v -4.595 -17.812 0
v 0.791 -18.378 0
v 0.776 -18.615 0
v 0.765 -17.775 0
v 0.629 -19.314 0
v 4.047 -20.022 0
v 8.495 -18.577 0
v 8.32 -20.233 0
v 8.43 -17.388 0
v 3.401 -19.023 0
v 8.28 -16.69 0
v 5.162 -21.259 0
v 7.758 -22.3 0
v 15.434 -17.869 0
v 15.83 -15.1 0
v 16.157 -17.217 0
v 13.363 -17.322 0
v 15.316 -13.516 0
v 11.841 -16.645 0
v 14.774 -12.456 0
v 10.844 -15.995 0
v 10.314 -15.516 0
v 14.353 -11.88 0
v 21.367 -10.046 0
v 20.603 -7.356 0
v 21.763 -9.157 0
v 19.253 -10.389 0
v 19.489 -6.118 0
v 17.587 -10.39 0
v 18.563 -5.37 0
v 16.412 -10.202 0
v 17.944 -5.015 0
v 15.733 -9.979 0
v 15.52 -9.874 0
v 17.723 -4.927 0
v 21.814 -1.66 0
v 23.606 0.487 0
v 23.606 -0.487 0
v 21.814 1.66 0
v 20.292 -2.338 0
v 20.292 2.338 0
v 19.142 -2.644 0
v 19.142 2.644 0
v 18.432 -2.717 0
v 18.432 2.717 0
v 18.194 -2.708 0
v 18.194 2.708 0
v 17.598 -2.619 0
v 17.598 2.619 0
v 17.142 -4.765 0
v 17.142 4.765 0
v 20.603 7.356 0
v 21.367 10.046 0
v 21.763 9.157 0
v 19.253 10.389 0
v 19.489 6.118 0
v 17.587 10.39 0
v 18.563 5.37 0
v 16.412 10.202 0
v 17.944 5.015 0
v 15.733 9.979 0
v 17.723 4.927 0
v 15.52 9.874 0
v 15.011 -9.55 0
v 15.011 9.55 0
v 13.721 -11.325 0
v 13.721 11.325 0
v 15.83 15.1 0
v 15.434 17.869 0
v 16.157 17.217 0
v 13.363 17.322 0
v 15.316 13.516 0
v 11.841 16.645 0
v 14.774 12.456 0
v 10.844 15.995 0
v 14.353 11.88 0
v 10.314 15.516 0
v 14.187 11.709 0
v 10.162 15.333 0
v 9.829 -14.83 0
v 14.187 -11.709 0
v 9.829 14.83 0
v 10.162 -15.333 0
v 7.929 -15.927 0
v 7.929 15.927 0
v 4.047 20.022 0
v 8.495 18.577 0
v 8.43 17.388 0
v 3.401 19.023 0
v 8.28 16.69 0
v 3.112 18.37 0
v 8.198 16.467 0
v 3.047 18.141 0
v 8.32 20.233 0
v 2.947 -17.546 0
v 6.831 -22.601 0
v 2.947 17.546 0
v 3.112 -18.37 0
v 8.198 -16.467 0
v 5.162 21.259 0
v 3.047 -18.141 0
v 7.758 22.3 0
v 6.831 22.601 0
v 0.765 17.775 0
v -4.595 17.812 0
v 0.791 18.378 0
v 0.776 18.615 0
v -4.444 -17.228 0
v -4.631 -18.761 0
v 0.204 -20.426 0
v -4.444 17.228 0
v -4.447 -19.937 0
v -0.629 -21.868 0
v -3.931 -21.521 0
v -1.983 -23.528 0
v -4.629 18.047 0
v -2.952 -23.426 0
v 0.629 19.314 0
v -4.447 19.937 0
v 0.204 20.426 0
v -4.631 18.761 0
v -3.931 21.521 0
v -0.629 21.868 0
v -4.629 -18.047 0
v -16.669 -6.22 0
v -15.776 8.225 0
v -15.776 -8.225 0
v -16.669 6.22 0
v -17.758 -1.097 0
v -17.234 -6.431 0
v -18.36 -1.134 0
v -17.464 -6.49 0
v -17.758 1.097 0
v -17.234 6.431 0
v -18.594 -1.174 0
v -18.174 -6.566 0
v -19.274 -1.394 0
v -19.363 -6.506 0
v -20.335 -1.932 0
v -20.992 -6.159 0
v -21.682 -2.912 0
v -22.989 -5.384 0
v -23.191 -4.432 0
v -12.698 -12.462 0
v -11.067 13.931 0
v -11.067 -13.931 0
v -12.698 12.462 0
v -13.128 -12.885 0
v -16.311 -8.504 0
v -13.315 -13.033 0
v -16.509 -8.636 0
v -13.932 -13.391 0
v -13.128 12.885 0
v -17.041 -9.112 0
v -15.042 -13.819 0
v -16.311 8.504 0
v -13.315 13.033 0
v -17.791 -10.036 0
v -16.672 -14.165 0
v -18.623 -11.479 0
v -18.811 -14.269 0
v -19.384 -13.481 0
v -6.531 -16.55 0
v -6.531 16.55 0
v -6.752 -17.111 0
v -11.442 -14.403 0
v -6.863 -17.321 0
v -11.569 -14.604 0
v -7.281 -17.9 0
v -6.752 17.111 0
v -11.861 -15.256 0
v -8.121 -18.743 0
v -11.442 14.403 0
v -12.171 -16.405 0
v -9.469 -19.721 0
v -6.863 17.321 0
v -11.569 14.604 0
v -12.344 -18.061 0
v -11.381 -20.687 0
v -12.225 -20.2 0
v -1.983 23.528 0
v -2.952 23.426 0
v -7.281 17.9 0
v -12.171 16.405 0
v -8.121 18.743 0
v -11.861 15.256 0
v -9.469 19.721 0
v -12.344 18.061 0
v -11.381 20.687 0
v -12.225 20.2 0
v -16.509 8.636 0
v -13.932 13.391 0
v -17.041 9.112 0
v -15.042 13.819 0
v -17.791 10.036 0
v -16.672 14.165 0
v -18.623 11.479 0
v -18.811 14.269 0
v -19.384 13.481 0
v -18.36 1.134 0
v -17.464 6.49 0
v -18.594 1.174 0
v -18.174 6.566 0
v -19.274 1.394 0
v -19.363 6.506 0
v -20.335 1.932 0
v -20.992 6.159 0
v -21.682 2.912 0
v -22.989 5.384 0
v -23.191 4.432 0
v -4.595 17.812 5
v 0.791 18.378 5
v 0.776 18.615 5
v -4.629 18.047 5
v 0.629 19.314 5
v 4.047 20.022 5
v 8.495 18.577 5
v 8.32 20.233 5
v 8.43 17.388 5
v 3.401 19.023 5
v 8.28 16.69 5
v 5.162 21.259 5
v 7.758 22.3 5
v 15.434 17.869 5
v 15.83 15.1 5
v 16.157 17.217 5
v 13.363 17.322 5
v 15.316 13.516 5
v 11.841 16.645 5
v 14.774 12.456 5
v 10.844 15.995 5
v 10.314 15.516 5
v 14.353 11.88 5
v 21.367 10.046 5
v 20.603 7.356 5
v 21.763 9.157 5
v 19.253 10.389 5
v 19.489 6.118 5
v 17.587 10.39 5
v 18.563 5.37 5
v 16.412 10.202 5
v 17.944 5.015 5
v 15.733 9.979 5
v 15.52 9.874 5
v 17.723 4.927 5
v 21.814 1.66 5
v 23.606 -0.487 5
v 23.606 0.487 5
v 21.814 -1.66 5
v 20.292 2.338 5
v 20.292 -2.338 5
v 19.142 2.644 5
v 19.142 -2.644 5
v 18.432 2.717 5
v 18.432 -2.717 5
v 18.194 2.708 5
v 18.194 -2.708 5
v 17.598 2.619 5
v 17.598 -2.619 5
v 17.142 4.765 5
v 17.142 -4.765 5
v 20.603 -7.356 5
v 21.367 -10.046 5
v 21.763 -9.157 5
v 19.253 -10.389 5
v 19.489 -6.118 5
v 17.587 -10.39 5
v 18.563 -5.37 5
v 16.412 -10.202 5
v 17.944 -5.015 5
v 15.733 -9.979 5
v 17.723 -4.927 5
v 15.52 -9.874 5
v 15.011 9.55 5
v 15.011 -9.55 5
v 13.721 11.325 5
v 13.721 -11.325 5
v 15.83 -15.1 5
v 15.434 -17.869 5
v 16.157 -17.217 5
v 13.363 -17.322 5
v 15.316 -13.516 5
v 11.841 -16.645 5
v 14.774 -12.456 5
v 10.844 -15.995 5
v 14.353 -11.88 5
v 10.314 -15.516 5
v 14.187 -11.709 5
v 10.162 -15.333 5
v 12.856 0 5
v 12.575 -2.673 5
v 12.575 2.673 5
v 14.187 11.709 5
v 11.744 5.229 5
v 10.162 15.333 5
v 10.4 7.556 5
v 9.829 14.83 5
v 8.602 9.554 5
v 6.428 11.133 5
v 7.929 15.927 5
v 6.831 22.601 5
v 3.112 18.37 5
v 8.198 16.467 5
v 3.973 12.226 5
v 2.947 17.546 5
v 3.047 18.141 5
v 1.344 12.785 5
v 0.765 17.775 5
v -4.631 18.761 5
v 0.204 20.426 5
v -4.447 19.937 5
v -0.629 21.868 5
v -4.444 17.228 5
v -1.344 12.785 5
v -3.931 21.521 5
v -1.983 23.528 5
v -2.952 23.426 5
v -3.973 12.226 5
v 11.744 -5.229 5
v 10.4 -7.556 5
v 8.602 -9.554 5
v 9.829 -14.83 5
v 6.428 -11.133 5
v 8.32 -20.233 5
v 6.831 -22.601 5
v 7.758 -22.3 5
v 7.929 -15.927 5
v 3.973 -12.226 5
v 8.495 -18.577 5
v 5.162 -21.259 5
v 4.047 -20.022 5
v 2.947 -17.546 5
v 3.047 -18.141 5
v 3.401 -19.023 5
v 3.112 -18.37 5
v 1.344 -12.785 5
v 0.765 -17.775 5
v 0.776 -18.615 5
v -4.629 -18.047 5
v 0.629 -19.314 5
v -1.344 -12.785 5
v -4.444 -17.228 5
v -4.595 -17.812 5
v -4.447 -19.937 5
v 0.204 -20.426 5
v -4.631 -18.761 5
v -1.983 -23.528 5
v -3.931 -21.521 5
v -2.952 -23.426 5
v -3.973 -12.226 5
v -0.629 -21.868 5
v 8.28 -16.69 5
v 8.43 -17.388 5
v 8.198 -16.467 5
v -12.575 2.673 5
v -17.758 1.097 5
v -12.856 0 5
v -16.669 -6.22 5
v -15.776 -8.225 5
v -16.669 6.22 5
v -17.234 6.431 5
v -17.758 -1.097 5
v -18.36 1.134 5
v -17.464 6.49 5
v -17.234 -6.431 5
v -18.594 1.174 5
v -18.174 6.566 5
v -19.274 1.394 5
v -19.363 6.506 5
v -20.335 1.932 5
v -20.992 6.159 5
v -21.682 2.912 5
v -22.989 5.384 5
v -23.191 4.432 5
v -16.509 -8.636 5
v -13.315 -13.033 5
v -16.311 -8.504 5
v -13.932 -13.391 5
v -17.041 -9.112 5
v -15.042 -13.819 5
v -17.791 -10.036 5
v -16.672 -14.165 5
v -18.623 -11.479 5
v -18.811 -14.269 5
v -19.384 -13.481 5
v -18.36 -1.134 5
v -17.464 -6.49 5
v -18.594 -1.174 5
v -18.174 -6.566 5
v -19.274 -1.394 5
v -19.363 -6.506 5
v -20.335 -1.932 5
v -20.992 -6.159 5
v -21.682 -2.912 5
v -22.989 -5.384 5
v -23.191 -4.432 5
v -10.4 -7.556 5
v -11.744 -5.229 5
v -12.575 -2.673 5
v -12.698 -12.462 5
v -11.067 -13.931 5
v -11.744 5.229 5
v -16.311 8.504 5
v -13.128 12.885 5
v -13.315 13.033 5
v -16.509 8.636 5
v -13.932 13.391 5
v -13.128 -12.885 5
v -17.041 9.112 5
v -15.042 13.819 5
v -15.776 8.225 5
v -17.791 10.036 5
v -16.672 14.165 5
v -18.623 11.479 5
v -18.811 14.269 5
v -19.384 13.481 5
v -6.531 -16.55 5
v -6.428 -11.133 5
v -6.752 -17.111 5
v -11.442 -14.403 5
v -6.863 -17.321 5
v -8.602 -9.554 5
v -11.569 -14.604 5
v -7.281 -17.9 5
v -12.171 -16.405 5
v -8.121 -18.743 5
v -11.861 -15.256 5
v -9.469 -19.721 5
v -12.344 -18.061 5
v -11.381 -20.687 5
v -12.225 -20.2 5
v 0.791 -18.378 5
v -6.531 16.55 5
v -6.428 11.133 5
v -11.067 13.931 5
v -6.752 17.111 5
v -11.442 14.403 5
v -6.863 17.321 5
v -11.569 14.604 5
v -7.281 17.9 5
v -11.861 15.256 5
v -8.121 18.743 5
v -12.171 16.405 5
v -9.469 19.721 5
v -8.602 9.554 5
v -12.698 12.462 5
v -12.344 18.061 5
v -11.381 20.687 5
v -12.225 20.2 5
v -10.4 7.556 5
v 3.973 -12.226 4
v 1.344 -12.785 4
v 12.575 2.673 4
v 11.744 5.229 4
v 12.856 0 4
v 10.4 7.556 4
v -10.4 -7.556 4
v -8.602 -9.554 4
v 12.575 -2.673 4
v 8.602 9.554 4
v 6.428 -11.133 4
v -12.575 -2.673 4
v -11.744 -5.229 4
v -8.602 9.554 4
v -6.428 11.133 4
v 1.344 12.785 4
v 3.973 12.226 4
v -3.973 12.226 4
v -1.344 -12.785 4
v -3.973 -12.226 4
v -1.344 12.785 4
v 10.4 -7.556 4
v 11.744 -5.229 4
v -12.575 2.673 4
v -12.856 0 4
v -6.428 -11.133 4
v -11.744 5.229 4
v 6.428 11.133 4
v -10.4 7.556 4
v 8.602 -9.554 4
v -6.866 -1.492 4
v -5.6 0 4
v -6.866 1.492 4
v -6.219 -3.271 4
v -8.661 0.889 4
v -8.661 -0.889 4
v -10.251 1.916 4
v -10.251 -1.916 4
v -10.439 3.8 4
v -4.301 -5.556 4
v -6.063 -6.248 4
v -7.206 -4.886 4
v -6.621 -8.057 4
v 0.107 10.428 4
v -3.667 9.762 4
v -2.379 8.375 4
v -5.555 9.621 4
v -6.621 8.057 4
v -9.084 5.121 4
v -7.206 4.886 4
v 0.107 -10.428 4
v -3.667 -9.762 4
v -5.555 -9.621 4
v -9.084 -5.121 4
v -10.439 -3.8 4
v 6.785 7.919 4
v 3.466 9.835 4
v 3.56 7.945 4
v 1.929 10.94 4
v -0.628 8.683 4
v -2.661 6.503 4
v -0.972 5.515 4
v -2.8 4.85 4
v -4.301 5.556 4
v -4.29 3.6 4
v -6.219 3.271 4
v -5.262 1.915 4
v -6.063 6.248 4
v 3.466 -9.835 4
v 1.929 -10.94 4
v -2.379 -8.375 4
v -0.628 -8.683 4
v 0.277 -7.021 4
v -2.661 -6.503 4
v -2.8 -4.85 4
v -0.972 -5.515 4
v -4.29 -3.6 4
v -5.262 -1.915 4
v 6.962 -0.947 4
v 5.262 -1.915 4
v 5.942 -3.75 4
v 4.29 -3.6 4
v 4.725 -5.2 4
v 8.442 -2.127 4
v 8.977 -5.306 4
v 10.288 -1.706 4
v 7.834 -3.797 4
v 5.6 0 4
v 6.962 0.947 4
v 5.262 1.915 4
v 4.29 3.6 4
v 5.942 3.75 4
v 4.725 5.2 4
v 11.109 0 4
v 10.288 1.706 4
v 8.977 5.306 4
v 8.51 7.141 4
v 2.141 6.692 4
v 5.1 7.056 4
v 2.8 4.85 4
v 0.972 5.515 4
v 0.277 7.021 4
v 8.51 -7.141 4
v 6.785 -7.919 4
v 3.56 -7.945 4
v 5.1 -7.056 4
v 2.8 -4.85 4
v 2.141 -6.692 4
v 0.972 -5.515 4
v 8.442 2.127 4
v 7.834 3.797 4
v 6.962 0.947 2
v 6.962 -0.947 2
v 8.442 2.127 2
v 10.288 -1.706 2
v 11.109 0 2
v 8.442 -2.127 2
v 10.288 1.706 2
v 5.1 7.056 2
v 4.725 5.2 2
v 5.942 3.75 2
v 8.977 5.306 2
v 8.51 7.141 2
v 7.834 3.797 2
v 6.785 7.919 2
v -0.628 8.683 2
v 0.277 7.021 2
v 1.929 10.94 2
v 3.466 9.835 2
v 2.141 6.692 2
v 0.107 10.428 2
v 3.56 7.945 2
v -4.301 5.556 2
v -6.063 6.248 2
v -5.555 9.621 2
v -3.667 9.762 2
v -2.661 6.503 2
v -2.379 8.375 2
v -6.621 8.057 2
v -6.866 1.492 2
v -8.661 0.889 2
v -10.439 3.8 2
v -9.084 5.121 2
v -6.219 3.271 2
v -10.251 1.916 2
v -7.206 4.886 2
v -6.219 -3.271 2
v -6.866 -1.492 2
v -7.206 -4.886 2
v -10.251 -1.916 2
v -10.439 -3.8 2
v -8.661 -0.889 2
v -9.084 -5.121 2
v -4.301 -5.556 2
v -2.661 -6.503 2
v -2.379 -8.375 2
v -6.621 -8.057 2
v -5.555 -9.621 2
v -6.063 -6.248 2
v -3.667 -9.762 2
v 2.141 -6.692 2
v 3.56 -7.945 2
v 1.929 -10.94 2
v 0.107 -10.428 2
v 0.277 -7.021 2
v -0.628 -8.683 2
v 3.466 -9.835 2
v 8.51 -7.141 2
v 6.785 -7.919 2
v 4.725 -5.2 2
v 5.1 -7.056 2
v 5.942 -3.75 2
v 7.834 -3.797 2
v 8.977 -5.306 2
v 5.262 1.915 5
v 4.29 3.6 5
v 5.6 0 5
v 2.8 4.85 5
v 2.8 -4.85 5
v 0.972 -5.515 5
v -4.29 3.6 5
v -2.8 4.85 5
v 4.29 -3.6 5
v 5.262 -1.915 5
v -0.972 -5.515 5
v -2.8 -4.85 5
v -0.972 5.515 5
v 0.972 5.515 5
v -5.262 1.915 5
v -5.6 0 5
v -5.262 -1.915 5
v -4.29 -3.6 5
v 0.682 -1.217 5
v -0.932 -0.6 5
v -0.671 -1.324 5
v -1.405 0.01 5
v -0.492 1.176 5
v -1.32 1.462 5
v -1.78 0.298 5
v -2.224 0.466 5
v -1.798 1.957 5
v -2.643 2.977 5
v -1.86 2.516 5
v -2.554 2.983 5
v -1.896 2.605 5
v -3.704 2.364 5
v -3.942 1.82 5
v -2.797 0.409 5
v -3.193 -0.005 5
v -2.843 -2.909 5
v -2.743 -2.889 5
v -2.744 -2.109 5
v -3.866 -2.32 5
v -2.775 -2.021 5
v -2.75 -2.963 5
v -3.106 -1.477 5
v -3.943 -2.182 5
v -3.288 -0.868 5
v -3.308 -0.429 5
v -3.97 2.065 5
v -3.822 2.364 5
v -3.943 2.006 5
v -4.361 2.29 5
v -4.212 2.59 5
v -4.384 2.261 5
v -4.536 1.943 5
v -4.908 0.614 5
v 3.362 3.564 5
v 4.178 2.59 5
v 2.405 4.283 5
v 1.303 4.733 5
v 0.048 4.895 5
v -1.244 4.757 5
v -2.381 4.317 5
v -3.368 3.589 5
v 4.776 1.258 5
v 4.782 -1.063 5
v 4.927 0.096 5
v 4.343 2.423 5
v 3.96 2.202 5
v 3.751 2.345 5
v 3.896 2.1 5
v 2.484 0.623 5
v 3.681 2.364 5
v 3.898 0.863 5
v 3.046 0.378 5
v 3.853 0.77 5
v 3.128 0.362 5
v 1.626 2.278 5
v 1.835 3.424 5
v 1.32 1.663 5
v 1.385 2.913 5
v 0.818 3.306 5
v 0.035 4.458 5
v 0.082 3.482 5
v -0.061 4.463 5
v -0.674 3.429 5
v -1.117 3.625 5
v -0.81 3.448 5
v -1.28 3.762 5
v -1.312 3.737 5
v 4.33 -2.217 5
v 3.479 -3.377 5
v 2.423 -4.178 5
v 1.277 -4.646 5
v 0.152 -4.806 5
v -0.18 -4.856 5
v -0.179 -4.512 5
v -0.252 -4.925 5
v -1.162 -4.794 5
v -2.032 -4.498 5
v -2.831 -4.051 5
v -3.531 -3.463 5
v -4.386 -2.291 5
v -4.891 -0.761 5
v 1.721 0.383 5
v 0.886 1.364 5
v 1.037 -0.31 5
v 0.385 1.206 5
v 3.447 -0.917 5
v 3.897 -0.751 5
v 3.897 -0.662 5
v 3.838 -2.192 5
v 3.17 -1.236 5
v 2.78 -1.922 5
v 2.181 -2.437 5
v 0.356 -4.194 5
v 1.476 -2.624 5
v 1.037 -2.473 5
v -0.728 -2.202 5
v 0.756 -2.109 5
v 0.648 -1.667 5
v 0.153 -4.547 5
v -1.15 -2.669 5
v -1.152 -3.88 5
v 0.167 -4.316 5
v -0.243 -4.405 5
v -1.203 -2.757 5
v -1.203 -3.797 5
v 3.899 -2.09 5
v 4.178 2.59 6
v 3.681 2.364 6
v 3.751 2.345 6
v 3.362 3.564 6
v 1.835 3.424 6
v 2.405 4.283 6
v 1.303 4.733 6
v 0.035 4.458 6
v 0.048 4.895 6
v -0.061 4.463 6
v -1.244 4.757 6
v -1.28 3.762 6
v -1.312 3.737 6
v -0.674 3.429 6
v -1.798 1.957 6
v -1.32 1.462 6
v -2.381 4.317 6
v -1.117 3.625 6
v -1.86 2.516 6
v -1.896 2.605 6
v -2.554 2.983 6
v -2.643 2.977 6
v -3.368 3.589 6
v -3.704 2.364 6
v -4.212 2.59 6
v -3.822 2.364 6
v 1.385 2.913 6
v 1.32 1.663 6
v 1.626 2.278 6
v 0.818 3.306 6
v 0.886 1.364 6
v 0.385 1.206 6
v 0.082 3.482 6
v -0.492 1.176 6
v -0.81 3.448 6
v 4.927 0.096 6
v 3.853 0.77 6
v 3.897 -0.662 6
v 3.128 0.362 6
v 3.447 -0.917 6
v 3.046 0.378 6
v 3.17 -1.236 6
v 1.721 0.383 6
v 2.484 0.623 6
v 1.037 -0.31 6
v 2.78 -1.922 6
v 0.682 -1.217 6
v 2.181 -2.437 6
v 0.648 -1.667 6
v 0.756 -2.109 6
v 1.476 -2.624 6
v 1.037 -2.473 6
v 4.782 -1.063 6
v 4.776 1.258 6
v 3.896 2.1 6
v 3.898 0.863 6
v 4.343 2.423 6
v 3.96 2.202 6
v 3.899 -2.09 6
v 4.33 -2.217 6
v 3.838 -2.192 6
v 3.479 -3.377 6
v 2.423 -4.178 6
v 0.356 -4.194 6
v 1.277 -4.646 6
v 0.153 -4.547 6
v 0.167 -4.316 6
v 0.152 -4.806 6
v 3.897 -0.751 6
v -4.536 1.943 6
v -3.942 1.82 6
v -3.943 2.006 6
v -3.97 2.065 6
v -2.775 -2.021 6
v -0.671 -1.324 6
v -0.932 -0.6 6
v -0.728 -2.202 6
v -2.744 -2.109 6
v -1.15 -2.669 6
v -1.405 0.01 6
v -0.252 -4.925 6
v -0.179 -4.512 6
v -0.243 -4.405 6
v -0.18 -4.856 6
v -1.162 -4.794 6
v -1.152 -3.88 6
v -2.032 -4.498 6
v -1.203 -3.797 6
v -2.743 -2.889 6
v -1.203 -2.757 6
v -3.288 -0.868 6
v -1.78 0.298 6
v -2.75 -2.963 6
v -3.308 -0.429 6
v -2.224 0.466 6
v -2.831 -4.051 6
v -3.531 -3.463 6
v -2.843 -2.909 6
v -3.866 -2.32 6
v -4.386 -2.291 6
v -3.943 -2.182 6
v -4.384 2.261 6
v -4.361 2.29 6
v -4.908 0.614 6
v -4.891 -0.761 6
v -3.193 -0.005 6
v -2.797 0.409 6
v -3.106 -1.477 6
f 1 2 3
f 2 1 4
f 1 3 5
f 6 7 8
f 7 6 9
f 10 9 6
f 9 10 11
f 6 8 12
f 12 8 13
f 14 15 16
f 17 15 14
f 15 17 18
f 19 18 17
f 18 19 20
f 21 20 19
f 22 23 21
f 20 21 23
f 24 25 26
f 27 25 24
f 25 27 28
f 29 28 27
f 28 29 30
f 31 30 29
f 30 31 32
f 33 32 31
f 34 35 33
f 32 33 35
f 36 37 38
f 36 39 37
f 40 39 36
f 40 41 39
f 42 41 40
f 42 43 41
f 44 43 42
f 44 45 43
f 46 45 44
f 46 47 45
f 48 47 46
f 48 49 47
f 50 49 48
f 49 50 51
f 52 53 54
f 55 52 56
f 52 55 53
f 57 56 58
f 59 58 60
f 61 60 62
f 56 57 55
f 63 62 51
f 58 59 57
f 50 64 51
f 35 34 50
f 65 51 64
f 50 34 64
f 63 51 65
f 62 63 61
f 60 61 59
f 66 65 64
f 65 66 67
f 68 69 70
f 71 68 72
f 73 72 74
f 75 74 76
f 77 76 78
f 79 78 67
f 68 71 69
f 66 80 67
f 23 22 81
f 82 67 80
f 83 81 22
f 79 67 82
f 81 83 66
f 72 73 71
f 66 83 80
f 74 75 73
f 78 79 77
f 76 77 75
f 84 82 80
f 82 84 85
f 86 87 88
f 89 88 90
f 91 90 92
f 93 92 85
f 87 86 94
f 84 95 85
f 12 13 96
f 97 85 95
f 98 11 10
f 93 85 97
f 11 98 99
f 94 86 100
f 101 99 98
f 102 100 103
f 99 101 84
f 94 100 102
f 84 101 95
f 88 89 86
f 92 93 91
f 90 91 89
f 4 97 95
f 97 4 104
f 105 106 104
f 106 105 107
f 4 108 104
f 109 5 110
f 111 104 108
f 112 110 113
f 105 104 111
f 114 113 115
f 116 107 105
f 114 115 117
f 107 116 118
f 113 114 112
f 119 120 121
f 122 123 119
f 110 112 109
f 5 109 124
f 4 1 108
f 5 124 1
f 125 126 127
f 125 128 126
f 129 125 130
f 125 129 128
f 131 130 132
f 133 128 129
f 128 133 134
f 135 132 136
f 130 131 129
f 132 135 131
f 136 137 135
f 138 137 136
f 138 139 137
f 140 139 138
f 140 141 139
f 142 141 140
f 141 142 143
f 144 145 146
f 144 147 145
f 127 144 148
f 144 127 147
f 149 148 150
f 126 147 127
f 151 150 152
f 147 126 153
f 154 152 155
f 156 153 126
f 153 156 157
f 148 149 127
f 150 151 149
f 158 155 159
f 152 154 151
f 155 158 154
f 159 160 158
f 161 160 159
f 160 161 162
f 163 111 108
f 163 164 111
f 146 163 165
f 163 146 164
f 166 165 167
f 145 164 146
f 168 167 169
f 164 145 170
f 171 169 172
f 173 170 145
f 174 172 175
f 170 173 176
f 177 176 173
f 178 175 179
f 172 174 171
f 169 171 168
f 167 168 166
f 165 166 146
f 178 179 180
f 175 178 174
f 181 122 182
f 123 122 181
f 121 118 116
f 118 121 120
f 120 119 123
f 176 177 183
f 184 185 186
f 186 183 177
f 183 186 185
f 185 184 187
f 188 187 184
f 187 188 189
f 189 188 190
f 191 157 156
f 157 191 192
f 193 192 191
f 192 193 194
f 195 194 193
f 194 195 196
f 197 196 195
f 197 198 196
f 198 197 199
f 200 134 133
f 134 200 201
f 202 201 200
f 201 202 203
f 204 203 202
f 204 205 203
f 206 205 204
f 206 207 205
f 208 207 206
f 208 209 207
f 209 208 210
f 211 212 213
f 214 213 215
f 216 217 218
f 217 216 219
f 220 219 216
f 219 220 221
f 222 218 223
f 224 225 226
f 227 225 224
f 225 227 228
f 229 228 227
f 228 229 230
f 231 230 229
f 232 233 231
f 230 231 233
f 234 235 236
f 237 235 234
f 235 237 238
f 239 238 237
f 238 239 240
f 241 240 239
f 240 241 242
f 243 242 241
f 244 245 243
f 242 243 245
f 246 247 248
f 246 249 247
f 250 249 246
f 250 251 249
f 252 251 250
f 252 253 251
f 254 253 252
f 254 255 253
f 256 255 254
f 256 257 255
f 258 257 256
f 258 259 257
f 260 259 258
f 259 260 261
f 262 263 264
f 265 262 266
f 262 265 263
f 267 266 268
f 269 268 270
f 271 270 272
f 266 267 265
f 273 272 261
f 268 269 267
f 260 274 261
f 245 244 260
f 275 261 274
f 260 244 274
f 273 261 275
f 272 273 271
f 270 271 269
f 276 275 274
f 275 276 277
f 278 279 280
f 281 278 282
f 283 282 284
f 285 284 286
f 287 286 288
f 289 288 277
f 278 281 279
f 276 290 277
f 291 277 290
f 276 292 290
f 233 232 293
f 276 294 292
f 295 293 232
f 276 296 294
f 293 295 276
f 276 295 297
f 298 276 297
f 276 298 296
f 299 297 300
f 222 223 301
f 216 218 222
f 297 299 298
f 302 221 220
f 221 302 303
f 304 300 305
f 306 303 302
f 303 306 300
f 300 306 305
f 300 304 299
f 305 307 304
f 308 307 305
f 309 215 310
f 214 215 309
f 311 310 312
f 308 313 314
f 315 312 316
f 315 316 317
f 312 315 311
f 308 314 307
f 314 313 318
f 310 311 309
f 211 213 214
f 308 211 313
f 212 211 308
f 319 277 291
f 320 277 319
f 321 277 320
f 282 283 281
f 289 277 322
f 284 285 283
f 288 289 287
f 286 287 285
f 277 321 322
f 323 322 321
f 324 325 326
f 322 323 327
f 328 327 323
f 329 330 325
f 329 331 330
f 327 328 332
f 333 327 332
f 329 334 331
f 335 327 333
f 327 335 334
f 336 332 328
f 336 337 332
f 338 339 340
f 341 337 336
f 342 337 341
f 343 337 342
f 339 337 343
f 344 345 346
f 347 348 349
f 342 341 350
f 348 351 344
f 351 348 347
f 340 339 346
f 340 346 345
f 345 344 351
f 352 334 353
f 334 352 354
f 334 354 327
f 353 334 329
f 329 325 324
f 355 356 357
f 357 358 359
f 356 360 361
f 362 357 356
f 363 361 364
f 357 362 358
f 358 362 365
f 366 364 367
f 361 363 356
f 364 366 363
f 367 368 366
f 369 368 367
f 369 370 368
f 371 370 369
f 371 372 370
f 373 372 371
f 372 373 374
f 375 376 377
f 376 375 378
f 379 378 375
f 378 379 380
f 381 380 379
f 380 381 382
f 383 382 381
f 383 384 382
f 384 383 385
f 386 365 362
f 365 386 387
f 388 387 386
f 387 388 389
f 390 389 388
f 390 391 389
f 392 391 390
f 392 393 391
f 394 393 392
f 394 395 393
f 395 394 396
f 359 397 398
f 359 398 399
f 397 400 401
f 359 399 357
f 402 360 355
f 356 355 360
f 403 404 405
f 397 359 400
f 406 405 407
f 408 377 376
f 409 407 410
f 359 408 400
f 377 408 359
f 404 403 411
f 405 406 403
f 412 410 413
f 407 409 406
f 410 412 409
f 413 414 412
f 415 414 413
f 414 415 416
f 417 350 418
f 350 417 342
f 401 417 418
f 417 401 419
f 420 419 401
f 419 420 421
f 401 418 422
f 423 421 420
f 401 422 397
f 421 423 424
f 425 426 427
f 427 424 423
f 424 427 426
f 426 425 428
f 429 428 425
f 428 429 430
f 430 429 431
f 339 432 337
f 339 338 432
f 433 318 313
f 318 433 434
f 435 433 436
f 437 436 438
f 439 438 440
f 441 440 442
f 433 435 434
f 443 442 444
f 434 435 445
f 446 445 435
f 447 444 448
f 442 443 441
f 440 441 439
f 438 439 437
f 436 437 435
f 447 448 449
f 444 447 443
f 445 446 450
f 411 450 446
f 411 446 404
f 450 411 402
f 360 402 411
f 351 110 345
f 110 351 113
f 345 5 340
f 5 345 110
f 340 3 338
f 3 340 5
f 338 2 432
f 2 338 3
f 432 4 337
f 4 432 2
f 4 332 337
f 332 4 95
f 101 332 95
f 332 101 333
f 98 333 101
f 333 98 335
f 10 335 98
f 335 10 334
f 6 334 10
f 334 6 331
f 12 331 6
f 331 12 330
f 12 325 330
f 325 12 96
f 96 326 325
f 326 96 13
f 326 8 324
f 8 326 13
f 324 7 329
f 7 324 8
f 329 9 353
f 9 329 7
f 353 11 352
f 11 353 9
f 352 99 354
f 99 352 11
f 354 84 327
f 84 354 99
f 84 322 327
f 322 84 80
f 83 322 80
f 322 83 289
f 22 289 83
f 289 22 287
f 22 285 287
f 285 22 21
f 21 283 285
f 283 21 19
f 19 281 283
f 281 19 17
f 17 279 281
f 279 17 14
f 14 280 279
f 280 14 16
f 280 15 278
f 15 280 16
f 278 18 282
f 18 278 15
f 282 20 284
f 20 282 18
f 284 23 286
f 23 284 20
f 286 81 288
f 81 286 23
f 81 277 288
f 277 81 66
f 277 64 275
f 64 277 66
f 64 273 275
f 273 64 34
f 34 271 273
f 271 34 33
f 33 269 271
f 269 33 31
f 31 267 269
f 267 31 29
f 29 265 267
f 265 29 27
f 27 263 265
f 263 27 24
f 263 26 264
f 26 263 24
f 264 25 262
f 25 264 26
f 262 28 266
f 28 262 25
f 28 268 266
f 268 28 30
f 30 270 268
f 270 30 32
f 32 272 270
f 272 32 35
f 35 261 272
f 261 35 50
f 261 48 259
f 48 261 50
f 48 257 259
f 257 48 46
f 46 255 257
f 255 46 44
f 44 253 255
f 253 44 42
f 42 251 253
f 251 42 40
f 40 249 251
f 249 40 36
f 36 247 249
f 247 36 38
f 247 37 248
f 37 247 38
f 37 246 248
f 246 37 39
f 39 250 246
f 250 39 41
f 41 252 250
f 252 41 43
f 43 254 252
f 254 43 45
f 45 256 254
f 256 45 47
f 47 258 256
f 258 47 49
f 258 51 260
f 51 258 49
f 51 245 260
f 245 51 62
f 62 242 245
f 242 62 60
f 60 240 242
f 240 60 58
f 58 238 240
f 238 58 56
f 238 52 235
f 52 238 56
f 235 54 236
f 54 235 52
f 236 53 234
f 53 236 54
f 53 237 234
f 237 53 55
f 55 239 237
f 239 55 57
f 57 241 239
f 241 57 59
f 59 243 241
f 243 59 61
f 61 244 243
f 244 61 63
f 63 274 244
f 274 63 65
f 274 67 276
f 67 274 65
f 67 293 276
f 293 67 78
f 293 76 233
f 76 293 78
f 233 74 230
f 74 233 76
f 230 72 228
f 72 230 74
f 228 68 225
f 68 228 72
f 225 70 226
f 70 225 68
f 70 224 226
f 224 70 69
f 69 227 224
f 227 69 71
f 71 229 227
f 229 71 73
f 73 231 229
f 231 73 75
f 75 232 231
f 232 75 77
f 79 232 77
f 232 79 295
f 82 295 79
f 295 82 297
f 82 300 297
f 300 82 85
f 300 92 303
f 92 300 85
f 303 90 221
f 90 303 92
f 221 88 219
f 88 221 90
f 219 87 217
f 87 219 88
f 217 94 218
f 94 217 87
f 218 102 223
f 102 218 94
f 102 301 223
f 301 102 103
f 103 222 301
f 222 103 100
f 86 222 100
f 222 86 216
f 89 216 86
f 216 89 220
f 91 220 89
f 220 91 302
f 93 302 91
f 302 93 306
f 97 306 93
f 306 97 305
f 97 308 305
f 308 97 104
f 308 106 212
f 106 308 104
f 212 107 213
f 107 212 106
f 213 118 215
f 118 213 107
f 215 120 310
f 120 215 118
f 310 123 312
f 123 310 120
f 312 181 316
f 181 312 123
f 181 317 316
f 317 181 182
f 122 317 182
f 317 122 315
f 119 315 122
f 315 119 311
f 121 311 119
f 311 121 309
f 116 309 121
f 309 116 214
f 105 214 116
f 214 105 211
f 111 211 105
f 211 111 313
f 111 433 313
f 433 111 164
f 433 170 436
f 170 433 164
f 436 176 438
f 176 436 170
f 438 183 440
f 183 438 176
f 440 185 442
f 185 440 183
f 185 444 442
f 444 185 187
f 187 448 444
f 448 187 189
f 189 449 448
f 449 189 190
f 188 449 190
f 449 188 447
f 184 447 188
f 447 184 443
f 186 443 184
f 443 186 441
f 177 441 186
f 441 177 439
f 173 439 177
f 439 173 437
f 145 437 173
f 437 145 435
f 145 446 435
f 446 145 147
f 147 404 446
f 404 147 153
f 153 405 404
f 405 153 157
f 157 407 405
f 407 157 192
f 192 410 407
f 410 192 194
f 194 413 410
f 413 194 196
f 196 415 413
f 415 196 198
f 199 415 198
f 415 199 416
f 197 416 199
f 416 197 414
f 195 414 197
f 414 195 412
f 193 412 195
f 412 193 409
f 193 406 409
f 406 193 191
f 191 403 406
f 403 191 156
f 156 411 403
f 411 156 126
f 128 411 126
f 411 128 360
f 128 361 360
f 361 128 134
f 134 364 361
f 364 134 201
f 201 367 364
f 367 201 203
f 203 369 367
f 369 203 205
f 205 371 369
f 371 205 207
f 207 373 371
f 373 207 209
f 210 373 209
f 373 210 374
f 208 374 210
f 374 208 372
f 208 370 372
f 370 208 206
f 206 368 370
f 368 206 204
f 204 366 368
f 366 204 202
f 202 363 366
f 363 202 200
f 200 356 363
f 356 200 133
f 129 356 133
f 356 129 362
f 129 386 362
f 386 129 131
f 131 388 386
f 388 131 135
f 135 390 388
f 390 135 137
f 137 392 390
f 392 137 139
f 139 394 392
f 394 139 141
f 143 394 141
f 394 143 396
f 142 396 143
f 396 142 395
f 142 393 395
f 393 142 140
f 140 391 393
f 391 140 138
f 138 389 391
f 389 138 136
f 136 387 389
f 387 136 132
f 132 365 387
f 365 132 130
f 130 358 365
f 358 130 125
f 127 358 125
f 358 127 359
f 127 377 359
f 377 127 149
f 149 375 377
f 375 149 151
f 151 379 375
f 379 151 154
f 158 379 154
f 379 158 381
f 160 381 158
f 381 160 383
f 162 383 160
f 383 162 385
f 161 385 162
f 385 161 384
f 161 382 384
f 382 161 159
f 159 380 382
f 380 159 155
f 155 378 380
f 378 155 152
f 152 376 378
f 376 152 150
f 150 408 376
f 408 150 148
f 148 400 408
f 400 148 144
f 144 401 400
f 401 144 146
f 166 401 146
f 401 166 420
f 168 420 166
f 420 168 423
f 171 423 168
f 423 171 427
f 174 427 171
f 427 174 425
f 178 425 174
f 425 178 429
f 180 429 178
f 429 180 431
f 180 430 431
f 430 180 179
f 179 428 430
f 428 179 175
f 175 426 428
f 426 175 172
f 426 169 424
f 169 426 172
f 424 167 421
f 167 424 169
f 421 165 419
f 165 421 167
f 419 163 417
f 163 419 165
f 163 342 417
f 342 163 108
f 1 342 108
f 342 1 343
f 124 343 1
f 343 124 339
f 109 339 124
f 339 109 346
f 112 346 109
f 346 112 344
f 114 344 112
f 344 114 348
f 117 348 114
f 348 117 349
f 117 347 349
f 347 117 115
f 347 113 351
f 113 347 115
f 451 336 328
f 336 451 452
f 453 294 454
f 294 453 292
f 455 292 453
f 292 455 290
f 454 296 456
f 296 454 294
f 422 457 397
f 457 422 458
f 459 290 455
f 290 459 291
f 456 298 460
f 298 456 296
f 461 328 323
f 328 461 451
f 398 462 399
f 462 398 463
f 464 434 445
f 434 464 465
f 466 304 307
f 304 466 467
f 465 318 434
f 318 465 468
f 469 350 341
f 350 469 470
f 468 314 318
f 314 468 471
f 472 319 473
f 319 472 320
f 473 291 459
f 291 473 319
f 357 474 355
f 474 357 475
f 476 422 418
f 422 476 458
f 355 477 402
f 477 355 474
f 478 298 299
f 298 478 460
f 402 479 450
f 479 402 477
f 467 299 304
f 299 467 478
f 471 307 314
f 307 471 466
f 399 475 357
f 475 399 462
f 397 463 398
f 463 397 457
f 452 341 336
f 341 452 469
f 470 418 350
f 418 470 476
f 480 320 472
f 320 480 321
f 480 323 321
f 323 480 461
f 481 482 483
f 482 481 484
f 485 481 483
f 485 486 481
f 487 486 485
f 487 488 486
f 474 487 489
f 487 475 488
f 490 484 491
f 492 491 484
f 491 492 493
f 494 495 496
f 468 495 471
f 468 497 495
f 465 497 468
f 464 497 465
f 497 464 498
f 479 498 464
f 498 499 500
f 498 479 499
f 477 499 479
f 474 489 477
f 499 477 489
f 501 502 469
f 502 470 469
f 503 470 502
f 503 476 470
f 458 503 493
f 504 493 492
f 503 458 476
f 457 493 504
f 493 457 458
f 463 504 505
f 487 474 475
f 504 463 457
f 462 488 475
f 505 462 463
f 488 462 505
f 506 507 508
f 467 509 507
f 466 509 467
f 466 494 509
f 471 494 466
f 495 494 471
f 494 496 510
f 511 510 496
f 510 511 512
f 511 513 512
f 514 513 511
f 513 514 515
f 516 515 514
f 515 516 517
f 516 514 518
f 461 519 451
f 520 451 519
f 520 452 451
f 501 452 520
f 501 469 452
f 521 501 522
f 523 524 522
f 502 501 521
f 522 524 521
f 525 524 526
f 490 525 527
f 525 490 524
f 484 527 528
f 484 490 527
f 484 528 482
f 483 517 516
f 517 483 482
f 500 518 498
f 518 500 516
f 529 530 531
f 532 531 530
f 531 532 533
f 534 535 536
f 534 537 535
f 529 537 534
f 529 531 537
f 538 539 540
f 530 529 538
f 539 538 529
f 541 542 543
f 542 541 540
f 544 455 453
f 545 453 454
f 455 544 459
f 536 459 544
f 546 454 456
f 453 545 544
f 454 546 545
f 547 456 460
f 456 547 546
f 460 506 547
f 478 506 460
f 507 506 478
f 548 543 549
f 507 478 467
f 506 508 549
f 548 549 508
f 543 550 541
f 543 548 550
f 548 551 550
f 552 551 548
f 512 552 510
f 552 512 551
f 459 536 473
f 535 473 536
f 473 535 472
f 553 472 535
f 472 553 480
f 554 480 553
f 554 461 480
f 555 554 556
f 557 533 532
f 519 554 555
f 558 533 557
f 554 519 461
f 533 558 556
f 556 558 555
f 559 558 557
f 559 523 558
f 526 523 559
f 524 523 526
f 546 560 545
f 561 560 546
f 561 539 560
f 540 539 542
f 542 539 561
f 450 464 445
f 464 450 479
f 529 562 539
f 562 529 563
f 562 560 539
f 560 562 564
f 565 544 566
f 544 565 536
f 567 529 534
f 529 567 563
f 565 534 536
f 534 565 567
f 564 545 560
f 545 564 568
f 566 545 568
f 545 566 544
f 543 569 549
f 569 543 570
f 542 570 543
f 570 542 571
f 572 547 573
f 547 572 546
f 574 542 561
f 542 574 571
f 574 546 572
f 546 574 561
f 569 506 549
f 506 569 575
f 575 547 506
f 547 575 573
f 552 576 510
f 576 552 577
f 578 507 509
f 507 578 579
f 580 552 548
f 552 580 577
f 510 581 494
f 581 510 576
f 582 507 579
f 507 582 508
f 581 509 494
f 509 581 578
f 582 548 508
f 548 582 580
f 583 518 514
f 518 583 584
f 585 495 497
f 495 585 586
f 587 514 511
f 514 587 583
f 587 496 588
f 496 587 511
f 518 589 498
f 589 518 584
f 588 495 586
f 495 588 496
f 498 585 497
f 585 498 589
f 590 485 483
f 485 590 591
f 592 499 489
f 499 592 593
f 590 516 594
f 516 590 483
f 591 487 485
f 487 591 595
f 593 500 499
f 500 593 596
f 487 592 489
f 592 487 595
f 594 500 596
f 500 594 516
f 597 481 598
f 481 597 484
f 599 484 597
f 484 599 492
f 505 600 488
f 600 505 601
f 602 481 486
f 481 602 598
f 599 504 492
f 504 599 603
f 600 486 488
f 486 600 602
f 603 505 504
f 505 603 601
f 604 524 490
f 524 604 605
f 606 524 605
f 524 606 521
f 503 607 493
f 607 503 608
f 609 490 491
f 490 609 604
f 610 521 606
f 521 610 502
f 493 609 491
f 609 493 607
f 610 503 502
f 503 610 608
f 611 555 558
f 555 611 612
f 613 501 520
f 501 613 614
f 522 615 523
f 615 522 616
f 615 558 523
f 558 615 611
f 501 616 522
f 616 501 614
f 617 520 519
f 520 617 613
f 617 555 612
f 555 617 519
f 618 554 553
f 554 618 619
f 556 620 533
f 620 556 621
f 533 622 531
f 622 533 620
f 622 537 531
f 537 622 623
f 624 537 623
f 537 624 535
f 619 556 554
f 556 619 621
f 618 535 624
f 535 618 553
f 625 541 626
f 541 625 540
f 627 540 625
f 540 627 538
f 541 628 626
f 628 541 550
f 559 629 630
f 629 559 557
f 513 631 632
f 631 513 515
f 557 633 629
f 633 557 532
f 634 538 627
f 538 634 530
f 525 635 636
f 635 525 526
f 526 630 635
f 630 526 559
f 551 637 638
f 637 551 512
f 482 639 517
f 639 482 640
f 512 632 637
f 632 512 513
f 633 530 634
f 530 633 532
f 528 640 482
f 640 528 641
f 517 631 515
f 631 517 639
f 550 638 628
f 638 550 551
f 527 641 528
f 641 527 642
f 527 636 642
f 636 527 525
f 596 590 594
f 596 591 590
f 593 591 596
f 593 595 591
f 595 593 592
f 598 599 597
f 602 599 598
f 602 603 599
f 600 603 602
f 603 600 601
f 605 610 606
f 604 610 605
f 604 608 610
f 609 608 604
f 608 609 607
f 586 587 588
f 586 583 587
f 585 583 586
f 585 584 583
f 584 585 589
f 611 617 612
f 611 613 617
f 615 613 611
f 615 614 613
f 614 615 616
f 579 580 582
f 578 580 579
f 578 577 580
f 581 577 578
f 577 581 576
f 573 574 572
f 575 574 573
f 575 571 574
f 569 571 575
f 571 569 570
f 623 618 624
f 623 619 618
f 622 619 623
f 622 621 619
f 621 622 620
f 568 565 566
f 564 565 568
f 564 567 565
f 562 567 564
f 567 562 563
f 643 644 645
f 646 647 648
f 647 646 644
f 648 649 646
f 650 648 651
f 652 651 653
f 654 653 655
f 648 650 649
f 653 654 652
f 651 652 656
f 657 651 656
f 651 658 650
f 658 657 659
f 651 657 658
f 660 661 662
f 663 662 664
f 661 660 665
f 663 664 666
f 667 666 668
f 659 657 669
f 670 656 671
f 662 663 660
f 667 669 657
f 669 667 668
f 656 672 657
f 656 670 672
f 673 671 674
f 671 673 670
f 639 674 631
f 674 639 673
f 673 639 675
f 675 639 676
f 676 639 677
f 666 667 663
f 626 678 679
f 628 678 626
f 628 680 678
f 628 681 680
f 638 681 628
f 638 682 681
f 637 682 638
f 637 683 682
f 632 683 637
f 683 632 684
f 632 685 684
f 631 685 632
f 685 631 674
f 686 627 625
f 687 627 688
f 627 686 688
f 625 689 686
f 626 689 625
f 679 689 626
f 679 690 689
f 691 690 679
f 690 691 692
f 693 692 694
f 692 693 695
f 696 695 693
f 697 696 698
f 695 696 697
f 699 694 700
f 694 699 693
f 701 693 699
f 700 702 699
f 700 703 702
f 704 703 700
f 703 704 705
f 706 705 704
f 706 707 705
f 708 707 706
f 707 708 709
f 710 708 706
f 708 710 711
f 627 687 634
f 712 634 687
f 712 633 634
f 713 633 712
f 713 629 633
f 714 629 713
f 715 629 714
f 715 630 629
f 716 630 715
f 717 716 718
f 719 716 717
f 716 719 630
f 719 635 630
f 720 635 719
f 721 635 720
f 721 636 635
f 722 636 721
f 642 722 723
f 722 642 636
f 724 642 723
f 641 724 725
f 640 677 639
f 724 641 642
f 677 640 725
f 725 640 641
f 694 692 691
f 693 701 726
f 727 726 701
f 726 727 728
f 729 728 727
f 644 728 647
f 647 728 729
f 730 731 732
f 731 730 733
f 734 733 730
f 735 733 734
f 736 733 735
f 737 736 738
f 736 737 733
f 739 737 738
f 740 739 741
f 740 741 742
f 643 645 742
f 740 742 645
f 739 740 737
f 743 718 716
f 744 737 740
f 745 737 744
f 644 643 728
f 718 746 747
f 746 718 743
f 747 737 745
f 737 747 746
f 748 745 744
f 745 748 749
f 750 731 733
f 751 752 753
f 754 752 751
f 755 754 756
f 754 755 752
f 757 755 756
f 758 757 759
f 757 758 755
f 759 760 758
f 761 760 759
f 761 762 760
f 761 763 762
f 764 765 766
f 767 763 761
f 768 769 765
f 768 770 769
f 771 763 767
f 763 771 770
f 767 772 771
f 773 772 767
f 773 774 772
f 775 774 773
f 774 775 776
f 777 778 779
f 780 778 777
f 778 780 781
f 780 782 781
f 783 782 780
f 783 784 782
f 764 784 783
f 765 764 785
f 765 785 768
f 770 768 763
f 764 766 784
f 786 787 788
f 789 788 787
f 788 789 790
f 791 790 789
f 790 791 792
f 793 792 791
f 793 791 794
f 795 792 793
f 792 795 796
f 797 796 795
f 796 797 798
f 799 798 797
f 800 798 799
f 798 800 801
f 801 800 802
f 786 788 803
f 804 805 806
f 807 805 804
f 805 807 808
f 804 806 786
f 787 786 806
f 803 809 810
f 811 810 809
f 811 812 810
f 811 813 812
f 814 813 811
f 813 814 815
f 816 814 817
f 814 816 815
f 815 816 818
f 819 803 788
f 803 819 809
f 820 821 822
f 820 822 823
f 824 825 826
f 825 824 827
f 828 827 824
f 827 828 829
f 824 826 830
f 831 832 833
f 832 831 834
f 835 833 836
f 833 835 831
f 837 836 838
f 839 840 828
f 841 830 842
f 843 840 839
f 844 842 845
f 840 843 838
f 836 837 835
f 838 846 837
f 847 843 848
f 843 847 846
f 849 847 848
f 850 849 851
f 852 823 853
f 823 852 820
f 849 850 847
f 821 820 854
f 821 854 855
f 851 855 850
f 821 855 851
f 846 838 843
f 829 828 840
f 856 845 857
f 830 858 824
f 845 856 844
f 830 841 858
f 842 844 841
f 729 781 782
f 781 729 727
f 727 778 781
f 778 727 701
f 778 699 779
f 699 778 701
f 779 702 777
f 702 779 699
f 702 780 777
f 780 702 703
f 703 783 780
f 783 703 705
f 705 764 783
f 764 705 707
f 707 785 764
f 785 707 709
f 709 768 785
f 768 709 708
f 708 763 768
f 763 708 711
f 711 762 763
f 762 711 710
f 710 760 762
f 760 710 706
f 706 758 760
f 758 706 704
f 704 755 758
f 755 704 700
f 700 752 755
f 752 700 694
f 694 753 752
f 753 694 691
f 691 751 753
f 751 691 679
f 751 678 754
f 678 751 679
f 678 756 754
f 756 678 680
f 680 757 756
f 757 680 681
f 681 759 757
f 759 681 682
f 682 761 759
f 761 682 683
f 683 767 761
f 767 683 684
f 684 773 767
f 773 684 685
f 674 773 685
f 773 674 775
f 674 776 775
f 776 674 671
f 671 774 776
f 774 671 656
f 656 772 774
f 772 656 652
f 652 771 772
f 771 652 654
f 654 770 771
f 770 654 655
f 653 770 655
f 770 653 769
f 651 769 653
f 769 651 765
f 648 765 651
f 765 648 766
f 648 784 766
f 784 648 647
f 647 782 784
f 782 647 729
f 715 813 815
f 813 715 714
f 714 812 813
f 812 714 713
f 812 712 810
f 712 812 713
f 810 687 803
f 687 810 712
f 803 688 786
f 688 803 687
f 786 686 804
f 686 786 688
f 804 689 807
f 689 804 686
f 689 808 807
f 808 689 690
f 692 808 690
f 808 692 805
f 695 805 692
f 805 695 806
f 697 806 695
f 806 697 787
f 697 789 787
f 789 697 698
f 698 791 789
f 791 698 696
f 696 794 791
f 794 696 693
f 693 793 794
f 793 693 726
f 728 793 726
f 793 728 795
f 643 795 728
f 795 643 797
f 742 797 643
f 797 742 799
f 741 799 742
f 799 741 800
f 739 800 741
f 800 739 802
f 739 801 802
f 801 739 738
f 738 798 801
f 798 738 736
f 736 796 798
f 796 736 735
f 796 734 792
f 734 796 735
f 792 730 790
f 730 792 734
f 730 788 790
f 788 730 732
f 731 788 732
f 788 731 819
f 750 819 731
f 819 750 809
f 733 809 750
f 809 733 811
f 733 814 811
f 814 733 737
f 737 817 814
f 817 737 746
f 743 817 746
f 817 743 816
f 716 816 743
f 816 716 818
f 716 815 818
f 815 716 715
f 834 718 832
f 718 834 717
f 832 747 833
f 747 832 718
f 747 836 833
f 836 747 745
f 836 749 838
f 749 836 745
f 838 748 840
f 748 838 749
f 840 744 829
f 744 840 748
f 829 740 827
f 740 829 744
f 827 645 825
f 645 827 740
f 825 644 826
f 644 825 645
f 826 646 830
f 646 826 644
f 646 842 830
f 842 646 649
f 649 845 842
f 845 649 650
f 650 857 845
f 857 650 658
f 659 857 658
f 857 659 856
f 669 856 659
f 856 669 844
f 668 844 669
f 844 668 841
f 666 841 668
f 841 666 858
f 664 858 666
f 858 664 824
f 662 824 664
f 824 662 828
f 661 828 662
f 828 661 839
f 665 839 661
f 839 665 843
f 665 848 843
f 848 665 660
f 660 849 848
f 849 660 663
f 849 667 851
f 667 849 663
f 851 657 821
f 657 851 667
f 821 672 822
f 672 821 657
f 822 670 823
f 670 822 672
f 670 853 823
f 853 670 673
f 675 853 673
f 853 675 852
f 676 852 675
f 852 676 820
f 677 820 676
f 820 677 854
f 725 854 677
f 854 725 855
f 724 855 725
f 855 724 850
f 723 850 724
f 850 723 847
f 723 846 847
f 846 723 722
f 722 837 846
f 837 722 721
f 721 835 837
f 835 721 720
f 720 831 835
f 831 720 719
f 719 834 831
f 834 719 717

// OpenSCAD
use <MCAD/involute_gears.scad>;
union(){
union(){
union(){

union(){
difference(){
gear (number_of_teeth=15,
			circular_pitch=500,
			hub_diameter=10,
			rim_width=5,
			rim_thickness=5,
			gear_thickness=4,
			hub_thickness=6,
			circles=9);


translate([0,0,0]) cylinder(r=5.6,h=8);
}
}



cylinder(r=12,h=2);
} 
cylinder(r=5.6,h=5);
}
translate([-5,-23.2,3]) linear_extrude(height=3) import("fablogo.dxf");
}
